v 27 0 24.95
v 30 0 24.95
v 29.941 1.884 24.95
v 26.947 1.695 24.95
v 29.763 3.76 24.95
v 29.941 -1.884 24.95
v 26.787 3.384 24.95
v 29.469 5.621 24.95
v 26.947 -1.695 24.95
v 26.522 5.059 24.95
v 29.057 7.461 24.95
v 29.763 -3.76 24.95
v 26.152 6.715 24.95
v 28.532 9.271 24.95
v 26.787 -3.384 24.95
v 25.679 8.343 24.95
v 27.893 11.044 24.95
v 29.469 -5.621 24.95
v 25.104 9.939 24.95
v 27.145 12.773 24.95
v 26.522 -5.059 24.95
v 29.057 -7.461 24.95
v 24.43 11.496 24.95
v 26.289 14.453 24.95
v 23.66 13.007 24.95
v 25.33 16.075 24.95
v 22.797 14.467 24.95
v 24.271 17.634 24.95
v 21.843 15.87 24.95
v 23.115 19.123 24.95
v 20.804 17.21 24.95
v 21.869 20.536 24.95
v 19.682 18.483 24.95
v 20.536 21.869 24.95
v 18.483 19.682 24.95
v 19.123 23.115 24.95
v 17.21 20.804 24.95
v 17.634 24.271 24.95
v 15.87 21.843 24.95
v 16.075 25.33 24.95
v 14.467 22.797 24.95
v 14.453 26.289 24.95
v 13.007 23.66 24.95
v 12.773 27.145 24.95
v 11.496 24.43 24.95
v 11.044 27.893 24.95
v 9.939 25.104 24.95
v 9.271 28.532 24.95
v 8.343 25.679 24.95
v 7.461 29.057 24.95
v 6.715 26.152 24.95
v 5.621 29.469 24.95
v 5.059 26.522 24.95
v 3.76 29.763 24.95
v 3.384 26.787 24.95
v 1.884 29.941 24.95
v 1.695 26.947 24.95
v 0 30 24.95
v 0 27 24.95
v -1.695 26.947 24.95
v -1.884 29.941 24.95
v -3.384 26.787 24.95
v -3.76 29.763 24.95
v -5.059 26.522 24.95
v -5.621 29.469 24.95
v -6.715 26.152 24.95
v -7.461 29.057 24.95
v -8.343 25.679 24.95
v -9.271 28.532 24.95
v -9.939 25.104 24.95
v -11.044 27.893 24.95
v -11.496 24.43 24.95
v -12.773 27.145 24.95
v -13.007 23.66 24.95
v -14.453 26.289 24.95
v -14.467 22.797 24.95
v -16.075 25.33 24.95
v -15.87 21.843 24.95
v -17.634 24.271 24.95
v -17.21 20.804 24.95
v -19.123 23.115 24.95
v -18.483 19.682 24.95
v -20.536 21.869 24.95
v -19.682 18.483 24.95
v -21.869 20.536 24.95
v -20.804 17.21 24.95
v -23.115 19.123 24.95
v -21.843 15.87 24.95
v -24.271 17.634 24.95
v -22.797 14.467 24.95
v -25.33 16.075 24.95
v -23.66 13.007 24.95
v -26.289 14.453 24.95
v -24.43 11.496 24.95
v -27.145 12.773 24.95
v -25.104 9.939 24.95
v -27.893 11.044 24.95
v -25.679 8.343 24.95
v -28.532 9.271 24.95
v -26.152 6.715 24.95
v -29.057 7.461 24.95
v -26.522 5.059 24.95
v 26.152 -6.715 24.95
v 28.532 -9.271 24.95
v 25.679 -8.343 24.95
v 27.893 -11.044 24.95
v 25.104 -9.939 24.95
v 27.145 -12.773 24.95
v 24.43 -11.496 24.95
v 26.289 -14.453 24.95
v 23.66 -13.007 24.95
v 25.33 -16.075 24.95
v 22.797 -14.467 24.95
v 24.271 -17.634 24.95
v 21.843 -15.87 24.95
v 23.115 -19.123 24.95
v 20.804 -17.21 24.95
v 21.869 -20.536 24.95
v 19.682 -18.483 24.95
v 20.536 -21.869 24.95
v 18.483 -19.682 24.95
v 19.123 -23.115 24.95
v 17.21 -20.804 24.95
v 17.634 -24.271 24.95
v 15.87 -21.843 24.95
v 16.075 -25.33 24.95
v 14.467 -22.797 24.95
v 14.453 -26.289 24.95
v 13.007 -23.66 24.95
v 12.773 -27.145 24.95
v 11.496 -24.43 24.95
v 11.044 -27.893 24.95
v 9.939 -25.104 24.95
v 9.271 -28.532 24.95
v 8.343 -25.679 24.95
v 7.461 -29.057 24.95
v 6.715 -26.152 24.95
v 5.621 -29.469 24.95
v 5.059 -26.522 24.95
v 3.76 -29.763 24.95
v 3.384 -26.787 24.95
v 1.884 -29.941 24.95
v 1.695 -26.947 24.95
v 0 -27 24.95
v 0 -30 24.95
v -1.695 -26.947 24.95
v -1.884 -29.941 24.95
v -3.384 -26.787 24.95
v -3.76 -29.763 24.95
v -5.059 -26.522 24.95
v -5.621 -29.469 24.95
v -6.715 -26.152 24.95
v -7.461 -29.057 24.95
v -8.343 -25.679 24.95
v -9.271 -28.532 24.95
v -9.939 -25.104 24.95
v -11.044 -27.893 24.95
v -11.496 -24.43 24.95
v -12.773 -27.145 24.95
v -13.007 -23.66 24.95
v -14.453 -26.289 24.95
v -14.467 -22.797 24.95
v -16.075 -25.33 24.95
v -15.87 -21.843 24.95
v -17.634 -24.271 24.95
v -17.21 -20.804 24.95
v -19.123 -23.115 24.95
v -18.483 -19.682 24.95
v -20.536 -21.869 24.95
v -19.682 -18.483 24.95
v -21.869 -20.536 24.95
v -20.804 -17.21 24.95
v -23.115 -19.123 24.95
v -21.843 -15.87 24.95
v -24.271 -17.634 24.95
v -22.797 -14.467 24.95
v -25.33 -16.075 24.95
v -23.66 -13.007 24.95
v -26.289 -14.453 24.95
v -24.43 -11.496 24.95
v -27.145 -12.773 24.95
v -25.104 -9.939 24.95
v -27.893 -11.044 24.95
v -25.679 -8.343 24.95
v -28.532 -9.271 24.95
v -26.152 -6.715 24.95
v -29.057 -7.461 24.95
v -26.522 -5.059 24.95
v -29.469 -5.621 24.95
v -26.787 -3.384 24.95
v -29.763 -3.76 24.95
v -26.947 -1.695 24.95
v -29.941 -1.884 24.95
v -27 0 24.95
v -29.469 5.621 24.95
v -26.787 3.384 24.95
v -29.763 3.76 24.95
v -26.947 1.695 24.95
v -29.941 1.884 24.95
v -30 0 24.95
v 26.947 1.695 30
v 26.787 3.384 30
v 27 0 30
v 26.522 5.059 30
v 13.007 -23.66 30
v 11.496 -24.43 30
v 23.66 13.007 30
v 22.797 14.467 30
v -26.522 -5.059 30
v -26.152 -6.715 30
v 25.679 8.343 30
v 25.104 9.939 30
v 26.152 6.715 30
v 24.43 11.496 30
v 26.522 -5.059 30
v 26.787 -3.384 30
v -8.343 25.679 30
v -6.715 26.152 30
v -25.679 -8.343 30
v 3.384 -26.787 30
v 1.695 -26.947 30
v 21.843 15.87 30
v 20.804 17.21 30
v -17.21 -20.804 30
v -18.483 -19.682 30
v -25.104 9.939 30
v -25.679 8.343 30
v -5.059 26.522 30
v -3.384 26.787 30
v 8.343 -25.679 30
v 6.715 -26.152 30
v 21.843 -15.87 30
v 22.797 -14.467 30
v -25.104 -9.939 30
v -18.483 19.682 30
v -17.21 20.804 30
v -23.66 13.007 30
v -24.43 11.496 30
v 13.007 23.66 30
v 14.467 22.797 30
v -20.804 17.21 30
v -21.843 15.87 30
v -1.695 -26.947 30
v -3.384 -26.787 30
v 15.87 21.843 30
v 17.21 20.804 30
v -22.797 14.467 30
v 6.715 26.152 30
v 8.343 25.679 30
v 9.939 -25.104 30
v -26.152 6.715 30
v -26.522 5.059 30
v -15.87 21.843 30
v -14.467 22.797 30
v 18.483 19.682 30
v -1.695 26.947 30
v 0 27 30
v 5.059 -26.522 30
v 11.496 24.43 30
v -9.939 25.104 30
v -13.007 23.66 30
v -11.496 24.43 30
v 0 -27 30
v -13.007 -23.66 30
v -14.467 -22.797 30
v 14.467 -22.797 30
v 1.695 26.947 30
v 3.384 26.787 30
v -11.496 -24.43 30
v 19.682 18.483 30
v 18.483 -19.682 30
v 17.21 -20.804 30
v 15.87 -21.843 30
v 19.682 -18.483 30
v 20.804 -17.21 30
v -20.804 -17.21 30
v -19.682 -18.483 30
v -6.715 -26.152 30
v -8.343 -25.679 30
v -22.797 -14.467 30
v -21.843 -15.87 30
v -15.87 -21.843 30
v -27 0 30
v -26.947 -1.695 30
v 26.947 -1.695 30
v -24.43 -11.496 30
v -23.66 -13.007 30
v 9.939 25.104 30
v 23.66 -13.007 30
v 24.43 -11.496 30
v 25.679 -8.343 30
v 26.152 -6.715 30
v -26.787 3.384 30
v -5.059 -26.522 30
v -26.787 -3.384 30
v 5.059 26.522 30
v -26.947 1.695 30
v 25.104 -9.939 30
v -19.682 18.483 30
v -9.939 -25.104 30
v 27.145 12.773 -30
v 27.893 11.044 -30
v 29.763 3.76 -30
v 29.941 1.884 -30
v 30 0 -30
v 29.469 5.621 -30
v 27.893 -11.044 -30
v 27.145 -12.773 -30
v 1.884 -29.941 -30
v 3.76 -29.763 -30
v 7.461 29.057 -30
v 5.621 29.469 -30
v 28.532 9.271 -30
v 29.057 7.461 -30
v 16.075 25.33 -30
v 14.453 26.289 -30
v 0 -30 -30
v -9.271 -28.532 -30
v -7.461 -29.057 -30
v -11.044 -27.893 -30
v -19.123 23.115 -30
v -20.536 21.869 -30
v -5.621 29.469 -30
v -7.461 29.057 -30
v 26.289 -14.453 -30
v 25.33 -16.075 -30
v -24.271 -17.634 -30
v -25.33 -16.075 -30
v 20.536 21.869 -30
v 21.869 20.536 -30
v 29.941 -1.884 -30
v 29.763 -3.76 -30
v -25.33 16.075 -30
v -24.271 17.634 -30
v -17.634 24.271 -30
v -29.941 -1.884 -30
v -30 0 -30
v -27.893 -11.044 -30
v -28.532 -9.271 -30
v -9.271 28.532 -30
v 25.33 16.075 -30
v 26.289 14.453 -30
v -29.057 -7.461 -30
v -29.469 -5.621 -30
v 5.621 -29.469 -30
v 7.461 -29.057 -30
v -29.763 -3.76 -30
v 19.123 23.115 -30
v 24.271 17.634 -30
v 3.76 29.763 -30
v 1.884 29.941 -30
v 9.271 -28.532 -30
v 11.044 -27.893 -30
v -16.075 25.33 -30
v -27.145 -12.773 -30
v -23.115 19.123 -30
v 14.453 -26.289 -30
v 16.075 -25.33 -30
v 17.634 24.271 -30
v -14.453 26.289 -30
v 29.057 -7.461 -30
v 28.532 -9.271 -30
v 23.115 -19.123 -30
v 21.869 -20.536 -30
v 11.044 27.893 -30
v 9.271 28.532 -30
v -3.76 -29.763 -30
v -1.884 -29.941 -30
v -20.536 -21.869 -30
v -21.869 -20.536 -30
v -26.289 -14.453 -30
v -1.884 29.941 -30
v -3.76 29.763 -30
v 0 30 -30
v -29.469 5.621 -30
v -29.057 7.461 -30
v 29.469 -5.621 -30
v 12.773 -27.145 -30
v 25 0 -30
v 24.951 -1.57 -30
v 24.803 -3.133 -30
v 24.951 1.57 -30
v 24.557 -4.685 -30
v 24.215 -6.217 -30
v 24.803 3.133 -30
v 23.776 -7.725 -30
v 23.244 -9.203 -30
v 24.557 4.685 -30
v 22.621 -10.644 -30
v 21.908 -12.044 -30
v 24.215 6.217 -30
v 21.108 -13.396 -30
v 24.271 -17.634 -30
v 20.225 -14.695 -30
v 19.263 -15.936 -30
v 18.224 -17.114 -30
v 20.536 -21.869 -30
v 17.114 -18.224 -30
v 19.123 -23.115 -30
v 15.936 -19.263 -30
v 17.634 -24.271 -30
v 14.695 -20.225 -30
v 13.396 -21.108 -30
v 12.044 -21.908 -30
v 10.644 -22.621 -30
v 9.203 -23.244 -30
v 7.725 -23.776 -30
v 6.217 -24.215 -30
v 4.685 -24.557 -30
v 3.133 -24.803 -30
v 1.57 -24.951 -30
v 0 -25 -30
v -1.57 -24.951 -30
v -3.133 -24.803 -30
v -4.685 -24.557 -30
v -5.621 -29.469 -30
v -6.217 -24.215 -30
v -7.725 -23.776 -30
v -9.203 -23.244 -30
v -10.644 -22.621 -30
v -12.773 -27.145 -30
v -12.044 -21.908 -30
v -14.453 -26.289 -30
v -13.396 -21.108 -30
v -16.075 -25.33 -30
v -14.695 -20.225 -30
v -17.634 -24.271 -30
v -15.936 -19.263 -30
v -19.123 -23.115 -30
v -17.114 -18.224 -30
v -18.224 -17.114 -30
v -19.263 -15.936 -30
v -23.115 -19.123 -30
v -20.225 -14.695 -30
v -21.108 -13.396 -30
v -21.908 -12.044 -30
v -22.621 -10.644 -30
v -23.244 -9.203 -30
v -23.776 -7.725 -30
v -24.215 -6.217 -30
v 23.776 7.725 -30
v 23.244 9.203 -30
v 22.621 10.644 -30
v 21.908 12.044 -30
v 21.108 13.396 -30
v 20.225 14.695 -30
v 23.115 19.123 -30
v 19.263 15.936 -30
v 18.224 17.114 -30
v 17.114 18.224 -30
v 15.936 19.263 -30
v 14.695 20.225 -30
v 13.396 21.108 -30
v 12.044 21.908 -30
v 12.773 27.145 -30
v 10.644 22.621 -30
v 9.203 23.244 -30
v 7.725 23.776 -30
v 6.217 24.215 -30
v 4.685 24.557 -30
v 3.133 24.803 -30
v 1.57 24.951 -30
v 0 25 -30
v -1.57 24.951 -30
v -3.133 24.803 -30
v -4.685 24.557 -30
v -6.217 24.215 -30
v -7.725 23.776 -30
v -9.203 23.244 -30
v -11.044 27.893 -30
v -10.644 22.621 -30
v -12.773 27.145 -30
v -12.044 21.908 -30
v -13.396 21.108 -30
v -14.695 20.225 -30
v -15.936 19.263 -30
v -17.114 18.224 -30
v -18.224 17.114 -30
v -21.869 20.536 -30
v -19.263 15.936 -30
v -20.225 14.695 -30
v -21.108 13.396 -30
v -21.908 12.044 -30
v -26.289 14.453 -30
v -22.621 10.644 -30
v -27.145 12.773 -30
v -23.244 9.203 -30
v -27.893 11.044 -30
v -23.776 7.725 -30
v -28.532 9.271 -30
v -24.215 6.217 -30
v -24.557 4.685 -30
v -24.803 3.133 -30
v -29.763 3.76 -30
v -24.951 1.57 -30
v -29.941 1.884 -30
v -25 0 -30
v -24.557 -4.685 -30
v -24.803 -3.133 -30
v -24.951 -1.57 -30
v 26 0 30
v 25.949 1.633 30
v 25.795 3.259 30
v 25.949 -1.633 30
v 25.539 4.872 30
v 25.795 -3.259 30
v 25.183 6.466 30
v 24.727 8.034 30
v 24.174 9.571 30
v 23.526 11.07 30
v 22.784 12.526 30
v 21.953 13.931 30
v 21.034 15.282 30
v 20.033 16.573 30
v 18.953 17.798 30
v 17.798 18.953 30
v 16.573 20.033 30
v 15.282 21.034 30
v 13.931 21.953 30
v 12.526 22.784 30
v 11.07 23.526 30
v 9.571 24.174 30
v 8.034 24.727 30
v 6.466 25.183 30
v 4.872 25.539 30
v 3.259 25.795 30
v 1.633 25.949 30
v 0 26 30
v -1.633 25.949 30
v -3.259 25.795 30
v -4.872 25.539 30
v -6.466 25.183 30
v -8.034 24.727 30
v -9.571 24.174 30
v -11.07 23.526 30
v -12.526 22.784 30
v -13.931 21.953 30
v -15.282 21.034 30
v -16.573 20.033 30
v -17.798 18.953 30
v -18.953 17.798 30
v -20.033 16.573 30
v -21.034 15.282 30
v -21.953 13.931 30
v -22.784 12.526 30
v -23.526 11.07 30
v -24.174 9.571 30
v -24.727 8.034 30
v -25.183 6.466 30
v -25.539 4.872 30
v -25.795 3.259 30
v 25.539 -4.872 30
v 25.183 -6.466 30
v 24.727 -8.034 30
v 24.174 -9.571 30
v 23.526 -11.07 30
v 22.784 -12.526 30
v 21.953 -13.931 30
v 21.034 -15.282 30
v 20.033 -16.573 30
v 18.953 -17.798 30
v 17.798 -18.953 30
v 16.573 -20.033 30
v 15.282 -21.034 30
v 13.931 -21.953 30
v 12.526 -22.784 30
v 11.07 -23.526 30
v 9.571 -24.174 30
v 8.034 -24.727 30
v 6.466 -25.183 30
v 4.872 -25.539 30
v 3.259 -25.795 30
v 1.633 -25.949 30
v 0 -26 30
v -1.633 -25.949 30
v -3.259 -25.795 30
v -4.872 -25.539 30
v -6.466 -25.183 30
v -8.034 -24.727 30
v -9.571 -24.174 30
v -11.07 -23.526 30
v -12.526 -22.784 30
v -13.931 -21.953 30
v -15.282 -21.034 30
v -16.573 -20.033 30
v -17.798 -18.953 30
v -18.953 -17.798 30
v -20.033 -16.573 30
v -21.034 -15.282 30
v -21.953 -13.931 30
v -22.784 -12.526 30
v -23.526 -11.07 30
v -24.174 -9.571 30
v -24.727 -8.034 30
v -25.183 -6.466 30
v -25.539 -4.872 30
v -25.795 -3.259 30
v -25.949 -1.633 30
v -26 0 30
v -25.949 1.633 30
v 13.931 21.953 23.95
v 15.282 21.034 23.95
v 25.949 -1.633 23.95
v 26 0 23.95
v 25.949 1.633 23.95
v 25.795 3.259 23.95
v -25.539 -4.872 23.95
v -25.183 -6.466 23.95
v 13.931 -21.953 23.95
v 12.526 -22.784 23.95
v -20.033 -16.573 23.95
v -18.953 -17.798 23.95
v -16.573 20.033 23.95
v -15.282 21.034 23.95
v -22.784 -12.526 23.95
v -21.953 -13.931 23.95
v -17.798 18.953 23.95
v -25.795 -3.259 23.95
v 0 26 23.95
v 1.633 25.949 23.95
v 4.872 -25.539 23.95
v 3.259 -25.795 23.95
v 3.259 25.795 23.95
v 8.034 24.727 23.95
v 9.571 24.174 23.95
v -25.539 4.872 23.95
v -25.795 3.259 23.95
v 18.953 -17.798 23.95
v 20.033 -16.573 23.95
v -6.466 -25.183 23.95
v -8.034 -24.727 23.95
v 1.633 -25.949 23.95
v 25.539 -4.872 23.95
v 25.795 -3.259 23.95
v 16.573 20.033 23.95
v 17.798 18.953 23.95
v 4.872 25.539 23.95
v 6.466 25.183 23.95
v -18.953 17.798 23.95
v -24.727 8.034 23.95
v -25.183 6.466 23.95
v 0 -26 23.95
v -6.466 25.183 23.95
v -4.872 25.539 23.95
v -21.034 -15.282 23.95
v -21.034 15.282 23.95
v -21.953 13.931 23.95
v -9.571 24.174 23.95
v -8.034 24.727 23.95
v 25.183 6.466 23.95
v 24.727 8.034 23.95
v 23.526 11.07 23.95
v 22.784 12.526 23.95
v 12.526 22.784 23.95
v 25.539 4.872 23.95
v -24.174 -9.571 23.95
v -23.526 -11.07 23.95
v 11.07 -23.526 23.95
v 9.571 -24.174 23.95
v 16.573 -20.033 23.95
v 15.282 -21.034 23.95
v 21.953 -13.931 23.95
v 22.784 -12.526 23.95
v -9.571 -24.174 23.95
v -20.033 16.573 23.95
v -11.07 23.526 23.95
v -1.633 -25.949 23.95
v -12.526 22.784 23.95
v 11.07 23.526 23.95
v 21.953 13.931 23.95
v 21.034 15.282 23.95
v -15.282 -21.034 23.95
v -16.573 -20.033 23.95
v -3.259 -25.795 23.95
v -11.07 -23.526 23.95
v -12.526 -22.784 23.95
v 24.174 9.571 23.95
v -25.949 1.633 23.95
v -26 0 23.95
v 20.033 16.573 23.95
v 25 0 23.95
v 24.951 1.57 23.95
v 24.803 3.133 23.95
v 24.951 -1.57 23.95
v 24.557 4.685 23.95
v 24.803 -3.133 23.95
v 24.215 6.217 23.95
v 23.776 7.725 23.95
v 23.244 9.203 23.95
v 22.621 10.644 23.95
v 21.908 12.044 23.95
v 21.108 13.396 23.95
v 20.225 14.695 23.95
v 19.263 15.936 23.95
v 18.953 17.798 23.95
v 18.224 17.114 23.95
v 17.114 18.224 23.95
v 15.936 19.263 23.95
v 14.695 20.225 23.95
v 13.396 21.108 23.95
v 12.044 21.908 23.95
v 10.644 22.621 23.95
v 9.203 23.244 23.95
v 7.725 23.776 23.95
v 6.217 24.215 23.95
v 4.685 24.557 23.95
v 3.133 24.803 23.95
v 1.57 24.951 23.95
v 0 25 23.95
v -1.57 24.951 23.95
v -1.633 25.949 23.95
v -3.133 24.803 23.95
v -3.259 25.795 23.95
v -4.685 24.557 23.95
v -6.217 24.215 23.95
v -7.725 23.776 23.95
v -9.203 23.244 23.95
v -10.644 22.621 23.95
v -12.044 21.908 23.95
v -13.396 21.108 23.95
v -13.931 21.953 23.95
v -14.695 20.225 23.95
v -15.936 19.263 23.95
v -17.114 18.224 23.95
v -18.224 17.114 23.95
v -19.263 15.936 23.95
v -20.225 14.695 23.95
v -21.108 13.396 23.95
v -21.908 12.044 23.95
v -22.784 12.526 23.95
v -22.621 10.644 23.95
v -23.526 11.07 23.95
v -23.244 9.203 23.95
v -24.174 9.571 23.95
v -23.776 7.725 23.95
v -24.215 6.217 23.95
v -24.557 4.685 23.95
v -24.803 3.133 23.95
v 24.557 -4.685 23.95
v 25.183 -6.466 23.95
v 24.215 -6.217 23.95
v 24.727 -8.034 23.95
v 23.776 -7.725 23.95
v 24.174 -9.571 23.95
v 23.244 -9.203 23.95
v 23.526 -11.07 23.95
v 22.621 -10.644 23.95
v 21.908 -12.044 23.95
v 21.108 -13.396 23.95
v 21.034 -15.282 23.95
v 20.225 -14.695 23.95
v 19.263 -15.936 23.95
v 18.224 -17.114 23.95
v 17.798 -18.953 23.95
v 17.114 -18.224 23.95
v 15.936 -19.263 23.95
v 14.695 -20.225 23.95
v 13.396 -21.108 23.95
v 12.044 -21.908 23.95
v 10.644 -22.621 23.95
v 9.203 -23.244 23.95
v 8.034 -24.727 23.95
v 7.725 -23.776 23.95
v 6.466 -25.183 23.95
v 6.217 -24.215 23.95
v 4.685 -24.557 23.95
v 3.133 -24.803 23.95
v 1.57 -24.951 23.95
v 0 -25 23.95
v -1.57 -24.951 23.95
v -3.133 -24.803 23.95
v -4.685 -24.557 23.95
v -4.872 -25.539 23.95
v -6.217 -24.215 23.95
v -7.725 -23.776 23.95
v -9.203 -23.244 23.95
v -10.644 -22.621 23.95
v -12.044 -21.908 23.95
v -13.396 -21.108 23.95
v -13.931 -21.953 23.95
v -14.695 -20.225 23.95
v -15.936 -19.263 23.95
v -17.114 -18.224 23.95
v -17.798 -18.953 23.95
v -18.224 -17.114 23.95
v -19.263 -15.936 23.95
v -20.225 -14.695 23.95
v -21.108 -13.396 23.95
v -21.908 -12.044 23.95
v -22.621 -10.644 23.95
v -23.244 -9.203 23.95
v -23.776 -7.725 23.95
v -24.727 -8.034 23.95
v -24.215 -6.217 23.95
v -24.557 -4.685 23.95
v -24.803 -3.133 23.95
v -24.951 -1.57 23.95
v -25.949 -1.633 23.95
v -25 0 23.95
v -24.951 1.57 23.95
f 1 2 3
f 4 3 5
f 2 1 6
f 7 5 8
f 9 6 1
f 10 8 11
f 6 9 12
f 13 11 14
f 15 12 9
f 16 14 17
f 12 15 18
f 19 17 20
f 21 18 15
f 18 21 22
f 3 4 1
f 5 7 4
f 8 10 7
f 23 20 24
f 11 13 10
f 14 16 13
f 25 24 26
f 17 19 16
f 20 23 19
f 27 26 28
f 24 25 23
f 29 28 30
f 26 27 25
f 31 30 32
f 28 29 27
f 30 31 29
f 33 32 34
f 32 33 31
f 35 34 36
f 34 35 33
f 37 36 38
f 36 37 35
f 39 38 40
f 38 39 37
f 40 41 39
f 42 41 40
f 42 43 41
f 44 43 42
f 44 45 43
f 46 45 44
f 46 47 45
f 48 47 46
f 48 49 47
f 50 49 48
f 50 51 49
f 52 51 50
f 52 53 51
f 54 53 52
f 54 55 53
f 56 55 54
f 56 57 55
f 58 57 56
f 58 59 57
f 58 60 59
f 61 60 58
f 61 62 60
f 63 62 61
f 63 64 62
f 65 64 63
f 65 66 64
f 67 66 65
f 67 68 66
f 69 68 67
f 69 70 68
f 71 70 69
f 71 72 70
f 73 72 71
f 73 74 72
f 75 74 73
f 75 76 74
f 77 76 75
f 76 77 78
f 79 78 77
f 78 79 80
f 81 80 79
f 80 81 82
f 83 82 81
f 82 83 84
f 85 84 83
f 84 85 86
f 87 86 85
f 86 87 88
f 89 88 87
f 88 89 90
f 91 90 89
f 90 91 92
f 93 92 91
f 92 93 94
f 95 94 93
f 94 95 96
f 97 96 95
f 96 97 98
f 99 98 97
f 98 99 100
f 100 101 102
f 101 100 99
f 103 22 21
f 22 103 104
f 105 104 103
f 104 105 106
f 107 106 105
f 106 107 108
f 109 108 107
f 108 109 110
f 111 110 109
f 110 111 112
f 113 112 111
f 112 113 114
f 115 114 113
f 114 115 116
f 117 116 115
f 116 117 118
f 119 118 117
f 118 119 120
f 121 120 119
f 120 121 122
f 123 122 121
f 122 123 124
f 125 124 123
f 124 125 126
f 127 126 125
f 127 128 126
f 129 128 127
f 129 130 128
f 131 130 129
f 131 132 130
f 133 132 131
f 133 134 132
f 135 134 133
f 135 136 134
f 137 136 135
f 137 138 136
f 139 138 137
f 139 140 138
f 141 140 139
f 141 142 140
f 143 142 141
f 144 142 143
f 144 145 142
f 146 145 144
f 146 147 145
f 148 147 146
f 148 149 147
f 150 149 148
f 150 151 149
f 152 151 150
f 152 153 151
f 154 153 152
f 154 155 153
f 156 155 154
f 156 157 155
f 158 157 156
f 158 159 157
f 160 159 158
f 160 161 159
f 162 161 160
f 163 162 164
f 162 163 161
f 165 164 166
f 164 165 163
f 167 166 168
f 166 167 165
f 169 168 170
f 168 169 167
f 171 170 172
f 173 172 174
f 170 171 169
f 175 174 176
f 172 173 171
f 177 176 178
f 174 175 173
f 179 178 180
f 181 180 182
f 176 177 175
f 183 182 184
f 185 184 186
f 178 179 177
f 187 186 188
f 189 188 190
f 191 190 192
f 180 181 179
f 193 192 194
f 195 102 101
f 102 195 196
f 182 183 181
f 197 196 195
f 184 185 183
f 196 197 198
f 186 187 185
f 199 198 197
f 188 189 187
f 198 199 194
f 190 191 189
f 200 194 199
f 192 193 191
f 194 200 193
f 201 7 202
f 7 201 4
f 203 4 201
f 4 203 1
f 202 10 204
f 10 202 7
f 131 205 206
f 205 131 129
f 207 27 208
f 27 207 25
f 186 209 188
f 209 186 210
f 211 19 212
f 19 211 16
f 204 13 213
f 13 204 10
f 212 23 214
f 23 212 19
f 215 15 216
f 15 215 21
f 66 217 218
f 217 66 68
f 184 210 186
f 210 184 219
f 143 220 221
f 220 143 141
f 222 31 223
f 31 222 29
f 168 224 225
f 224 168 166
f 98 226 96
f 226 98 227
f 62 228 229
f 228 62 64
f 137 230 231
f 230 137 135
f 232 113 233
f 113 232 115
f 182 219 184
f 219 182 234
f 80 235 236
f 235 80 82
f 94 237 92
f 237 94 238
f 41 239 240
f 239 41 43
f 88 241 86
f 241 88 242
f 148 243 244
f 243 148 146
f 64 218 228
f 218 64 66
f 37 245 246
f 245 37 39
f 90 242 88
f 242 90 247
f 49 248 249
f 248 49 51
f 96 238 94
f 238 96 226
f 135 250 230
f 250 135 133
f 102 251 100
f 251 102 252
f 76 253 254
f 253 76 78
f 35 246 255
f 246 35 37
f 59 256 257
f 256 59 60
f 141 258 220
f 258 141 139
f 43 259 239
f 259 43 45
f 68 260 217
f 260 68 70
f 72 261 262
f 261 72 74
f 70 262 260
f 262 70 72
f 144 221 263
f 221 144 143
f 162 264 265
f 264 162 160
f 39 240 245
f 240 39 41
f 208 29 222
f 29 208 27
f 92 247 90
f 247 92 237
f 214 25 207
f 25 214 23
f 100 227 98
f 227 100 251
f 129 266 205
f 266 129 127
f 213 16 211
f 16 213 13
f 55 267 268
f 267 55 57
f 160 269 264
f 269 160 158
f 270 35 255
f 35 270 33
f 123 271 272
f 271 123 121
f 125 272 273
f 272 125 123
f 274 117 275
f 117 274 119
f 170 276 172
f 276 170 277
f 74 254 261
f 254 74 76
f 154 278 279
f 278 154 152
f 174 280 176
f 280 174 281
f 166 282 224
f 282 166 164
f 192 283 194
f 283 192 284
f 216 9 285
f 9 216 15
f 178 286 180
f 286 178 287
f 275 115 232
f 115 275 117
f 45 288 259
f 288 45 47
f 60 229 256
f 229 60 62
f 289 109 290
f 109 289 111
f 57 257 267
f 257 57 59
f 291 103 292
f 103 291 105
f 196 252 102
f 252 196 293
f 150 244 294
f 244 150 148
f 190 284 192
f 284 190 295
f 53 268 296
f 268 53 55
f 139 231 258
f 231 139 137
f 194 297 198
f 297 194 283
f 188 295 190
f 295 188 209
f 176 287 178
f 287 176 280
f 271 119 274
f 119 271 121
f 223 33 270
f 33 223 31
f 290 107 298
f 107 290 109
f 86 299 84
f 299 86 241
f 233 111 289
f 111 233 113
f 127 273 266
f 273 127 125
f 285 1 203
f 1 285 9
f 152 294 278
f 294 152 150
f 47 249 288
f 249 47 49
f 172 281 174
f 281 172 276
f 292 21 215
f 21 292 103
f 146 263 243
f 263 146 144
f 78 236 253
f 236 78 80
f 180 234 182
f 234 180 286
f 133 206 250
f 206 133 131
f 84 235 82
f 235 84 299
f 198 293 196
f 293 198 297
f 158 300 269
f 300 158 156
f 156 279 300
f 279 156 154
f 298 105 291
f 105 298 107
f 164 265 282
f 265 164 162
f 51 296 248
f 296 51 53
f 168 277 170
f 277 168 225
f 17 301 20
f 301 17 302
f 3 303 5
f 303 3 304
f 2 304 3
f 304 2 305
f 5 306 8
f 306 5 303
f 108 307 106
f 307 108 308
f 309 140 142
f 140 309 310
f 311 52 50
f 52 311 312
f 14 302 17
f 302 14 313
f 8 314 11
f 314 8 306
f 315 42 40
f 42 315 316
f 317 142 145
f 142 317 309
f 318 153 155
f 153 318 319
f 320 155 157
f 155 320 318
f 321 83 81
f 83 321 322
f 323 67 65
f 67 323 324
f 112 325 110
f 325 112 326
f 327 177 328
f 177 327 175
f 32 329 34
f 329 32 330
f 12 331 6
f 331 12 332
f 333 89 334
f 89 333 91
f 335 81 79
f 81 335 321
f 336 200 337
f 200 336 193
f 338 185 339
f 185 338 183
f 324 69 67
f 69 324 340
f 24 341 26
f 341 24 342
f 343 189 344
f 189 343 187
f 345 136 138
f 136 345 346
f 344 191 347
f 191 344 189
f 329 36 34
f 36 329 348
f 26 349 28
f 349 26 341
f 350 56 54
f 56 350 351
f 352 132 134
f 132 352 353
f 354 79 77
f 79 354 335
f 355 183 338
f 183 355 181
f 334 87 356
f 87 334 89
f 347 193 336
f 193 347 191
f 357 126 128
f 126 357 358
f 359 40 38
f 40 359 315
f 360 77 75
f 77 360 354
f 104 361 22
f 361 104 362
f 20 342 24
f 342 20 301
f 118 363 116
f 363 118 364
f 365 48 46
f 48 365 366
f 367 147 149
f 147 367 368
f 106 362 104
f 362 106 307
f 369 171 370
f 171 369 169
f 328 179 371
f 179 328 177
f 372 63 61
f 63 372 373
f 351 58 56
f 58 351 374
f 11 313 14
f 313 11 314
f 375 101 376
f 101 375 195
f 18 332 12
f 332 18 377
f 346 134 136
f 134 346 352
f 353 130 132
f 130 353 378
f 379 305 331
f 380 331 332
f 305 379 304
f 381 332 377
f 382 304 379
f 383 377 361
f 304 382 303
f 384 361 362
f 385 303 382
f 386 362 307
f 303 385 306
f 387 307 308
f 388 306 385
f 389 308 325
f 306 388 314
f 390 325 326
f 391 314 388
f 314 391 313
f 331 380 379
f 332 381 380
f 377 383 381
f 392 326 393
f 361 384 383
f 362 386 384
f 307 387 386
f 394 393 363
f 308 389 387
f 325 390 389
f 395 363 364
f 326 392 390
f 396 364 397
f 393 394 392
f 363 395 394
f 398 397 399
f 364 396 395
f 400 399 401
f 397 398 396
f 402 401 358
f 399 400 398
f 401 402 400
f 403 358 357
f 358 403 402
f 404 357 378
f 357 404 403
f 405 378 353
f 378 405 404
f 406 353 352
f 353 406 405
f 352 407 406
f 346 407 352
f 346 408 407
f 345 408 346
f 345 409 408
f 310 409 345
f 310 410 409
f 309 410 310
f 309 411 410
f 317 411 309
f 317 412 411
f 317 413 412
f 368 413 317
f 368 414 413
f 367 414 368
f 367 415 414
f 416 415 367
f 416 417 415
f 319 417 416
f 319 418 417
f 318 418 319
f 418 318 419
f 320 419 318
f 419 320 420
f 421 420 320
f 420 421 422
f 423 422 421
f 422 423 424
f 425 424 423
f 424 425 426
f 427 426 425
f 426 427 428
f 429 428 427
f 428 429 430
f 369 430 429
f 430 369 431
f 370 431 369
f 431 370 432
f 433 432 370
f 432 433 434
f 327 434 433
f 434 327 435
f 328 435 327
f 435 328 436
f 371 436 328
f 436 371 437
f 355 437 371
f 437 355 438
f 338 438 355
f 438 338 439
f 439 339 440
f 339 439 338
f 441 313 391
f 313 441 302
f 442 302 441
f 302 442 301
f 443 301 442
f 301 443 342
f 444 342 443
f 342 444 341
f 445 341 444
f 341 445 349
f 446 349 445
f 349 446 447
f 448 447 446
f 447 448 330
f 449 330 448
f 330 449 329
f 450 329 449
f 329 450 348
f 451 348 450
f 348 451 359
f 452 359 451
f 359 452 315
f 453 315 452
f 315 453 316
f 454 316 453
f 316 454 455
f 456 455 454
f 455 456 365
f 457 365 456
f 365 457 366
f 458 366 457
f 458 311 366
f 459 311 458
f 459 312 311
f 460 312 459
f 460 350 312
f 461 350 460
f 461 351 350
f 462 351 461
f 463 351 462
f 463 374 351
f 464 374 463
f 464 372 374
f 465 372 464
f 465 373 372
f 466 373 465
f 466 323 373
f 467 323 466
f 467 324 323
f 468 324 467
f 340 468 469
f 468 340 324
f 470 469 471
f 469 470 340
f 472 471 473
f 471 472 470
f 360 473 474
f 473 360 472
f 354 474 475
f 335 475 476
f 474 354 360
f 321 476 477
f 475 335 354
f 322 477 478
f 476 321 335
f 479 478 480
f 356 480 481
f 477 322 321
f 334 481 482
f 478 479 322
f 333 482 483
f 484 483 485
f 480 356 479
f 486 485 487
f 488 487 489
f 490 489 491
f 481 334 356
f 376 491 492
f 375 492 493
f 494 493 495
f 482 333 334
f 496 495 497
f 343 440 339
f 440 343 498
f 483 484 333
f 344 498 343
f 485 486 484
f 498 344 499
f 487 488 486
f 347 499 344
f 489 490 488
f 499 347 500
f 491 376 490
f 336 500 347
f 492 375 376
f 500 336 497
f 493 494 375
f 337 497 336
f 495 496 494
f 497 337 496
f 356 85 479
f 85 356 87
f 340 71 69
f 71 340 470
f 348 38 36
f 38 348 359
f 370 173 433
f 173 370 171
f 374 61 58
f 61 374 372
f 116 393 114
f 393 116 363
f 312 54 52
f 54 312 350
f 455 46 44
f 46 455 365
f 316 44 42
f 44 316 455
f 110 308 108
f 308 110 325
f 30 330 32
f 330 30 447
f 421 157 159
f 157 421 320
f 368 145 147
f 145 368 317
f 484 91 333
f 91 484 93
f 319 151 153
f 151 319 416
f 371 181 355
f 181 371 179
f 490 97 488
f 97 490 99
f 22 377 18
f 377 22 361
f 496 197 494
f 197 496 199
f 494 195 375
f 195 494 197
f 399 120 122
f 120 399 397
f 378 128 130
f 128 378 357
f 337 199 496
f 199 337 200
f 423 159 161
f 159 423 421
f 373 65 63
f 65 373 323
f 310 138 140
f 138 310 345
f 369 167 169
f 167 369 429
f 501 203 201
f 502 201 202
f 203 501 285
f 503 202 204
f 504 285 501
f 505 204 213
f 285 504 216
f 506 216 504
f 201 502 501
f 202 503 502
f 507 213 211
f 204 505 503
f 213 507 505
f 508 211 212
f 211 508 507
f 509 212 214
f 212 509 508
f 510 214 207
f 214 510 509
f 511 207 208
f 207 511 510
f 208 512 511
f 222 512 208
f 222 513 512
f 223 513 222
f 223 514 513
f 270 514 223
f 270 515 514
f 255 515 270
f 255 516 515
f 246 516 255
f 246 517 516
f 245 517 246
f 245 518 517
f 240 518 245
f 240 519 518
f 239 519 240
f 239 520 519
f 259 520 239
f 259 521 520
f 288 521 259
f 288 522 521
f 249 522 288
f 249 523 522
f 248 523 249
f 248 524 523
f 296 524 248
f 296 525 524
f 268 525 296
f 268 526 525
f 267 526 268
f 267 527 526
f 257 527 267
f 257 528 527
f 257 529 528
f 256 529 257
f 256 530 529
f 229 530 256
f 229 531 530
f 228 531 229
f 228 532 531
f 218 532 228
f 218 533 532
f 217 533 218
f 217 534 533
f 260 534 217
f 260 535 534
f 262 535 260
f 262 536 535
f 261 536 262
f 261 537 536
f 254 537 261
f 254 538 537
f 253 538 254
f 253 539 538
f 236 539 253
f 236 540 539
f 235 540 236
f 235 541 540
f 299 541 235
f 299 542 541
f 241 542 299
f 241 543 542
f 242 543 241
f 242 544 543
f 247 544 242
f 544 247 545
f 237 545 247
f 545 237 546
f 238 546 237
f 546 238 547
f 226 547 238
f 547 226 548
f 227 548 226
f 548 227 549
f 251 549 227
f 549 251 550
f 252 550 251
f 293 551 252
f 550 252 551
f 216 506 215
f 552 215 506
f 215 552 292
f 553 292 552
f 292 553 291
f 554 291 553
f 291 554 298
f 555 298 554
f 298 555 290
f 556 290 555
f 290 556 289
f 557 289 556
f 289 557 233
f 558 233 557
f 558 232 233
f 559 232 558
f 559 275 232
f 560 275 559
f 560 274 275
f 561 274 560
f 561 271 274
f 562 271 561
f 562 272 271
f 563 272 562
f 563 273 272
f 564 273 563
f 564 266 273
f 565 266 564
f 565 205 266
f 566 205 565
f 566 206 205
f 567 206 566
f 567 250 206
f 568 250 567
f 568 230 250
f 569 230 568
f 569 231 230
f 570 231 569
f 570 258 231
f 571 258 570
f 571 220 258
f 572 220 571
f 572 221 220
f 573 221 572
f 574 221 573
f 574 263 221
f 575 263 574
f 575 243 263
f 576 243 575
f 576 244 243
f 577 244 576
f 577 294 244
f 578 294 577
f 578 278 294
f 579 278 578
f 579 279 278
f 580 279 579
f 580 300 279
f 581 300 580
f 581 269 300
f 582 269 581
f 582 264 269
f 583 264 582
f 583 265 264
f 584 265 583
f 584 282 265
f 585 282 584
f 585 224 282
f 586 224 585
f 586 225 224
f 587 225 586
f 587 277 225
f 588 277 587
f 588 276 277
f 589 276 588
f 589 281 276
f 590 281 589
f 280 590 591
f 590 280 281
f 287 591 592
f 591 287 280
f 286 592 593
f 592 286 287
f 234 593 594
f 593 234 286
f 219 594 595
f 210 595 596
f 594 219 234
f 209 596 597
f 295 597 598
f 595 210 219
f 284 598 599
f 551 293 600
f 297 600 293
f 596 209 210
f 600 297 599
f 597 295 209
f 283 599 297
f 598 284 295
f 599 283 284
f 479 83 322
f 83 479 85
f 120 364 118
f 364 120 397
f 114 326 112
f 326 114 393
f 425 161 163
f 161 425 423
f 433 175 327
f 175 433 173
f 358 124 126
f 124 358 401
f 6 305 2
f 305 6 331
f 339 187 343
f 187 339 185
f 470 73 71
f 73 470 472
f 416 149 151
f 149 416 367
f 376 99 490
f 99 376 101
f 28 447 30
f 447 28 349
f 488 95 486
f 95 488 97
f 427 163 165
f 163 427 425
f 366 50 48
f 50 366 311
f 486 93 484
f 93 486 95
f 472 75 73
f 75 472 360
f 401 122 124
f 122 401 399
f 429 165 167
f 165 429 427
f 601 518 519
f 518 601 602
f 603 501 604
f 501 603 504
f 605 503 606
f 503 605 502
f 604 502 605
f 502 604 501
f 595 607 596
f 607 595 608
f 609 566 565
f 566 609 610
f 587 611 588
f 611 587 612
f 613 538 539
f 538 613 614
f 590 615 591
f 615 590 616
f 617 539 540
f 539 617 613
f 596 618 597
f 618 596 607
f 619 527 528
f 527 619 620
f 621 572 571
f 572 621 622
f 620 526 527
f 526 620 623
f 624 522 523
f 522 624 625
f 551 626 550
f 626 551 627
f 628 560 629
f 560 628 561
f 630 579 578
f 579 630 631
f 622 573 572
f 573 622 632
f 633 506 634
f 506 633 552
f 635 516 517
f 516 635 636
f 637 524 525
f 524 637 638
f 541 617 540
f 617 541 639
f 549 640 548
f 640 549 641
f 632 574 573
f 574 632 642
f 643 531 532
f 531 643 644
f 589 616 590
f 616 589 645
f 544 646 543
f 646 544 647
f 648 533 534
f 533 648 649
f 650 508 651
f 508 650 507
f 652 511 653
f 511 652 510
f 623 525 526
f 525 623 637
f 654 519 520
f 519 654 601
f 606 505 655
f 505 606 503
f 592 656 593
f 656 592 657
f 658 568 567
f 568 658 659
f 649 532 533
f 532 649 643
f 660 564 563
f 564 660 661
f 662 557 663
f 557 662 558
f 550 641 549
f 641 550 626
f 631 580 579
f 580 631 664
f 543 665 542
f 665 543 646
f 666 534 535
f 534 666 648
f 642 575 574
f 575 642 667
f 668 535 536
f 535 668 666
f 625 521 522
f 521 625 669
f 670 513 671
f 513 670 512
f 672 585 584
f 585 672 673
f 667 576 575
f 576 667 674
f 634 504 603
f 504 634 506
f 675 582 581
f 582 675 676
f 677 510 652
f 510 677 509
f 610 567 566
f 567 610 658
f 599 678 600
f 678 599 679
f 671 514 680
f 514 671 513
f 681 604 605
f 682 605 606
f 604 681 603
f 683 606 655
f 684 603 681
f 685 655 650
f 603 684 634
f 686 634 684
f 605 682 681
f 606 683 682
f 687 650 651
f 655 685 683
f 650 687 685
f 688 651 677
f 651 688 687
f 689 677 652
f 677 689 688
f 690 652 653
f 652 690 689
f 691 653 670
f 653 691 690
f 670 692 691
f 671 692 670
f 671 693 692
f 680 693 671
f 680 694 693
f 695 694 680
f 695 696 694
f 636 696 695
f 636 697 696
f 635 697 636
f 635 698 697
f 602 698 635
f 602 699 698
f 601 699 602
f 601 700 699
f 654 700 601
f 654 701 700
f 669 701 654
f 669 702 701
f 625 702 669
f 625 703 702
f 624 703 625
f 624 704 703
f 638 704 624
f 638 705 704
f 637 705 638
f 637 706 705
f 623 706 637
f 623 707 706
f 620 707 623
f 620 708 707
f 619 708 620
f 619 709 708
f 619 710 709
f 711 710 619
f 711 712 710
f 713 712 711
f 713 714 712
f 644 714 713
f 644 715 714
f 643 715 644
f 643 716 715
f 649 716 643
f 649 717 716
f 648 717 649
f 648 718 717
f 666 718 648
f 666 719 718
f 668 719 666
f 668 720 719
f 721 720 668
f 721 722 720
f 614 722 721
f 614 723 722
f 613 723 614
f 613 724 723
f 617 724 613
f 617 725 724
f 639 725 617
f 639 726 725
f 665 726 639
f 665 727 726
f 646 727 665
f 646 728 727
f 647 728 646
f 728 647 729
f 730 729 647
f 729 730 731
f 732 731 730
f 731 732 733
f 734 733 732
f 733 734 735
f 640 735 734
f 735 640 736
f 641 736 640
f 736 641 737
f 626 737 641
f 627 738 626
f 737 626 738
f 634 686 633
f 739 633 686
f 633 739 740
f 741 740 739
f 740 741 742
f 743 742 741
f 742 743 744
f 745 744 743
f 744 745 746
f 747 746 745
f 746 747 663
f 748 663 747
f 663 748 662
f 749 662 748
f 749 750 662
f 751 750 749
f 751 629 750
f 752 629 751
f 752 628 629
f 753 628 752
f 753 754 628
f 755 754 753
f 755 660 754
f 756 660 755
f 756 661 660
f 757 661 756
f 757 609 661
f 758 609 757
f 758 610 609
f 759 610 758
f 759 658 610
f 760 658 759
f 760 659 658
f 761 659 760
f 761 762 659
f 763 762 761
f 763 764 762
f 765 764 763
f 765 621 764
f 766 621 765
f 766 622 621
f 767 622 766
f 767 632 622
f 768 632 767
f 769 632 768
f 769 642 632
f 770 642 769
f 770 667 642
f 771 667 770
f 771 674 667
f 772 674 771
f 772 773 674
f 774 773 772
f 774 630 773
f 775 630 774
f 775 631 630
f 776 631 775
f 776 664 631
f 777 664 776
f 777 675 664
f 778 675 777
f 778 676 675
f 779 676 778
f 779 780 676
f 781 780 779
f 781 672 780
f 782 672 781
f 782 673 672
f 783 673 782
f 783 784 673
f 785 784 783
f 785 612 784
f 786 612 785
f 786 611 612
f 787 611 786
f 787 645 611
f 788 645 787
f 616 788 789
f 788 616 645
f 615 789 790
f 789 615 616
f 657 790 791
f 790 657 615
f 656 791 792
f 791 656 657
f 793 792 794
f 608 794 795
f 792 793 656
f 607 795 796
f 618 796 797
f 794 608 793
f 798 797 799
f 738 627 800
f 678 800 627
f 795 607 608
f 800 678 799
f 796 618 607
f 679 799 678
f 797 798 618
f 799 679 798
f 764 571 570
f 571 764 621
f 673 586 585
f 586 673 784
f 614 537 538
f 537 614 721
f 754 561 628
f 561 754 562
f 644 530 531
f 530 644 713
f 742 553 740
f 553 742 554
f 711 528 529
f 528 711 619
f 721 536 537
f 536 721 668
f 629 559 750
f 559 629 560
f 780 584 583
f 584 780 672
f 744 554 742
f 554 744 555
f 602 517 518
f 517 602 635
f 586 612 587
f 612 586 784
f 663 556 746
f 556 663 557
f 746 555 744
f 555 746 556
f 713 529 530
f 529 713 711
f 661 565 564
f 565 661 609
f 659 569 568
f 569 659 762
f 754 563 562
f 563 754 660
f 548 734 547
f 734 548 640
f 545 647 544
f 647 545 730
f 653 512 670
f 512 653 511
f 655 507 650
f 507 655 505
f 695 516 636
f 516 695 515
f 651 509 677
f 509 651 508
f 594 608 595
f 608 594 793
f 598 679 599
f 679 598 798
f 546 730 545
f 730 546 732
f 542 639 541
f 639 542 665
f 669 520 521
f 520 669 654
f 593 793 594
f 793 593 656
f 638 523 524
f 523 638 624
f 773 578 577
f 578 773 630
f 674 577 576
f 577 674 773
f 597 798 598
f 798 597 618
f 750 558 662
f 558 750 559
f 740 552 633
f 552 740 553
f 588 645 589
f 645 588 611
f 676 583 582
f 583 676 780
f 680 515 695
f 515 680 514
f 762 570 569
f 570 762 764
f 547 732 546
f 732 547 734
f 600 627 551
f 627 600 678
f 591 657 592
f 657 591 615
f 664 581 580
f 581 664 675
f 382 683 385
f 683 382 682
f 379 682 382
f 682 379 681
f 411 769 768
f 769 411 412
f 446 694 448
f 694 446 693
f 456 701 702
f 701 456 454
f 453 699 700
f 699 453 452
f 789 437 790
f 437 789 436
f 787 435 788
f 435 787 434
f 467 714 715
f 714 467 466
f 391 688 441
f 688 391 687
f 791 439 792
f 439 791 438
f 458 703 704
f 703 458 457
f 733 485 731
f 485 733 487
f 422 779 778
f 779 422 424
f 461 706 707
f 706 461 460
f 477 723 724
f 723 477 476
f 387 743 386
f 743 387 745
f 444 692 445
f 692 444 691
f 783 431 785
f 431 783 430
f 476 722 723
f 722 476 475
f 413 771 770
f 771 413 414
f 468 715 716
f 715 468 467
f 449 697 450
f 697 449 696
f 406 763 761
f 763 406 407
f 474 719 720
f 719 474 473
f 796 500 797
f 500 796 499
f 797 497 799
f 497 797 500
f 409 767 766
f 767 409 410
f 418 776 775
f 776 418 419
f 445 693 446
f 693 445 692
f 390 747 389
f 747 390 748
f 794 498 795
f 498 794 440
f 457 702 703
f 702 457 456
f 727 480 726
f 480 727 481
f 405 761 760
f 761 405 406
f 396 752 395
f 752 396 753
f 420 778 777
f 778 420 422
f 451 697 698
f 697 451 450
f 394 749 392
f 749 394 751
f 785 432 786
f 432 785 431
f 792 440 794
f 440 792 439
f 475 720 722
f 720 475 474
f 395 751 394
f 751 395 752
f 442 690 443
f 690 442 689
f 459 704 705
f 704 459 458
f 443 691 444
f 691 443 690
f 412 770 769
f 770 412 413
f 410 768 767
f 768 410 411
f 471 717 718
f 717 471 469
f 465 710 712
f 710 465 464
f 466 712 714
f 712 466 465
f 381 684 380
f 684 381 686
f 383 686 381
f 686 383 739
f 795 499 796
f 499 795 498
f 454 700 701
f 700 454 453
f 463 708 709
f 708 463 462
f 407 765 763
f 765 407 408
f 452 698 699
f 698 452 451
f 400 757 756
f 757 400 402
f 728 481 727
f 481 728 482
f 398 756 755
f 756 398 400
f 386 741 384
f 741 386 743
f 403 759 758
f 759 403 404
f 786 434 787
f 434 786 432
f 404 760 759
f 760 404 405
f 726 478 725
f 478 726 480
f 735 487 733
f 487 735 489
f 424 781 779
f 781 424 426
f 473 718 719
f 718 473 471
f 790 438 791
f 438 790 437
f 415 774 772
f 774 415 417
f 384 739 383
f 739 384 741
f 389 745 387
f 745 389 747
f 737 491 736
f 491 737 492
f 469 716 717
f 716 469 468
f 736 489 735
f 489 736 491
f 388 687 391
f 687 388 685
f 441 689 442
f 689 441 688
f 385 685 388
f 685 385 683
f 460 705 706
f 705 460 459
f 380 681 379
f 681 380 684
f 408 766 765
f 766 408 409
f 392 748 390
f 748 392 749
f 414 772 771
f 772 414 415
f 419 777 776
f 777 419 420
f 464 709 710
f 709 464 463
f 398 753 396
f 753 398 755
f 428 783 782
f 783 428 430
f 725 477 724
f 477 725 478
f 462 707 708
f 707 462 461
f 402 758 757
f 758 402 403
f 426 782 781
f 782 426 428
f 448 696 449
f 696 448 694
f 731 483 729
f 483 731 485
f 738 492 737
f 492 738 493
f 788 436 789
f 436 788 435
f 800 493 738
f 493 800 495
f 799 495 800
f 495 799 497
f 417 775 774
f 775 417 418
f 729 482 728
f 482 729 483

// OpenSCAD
$fn=40; // model faces resolution.

prumer_rotoru1=60;
vyska_rotoru1=5;
vyska_rotoru2=5;
prumer_sroubu=3.2;
prumer_hlavy_sroubu=6;
vyska_hlavy_sroubu=4;
vyska_matky=3;
sirka_matky=6;
prumer_orechu=10;
sila_materialu=2;
sila_materialu_vule=0.2;
hloubka_prekryti=2;

//lozisko
lozisko_prumer_vnitrni=5;
lozisko_prumer_vnejsi=16;
lozisko_vyska=5;
lozisko_prekryv=1.5;

//stator1
stator1_sila=2;

//stator2
sila_pod_loziskem=1;

//stator3
stator3_sila_steny=2;
stator3_vzdalenost_od_steny=1; //definuje vzdalenost hlavy sroubu od steny statrou 4
stator3_vyska=60;
stator3_vyska_prekryti=5;

vule1=1; //vůle mezi statorem a rotorem ze strany

//nastevní rotoru2
vyska_kryti=5;

//lopatka
hloubka_uchytu=20;
sila_uchytu=12;
vyska_uchytu=10;
tolerance_uchytu=0.1;

//parametry uchytu senzoru
roztec_der=10.16;
vzdalenost_der_x=2*roztec_der;
vzdalenost_der_y=1*roztec_der;







difference()
{
  
cylinder (h = stator3_vyska, r=(prumer_rotoru1)/2, center = true, $fn=100); 
 
    translate([0,0,(stator3_vyska-lozisko_vyska-sila_pod_loziskem)/2])
    
cylinder (h = lozisko_vyska+sila_pod_loziskem+0.1, r=(prumer_rotoru1-2*sila_materialu-2*vule1-stator3_sila_steny)/2, center = true, $fn=100);

cylinder (h = stator3_vyska+0.1, r=(prumer_rotoru1-2*sila_materialu-2*vule1-2*stator3_sila_steny)/2, center = true, $fn=100);
    
   
    
    
 translate([0,0,(stator3_vyska-stator3_vyska_prekryti)/2])    
difference()  
 {   
     
cylinder (h = stator3_vyska_prekryti+0.1, r=(prumer_rotoru1+0.1)/2, center = true, $fn=100); 
 
     
 cylinder (h = stator3_vyska_prekryti+0.1, r=(prumer_rotoru1-2*sila_materialu-2*vule1)/2, center = true, $fn=100);   
    
 }   
    
    
    
    
    
    






//otvory pro uchyceni stator 3
//otvor pro sroub 1
      translate([0,(prumer_rotoru1-2*sila_materialu-2*vule1-2*stator3_sila_steny-prumer_hlavy_sroubu-2*stator3_vzdalenost_od_steny)/2,0])
cylinder (h = lozisko_vyska+sila_pod_loziskem+0.1, r=prumer_sroubu/2, center = true, $fn=100);

      translate([0,(prumer_rotoru1-2*sila_materialu-2*vule1-2*stator3_sila_steny-prumer_hlavy_sroubu-2*stator3_vzdalenost_od_steny)/2,2])
cylinder (h = lozisko_vyska+sila_pod_loziskem+0.1, r=prumer_hlavy_sroubu/2, center = true, $fn=100);

//otvor pro sroub 2
      translate([0,-(prumer_rotoru1-2*sila_materialu-2*vule1-2*stator3_sila_steny-prumer_hlavy_sroubu-2*stator3_vzdalenost_od_steny)/2,0])
cylinder (h = lozisko_vyska+sila_pod_loziskem+0.1, r=prumer_sroubu/2, center = true, $fn=100);

      translate([0,-(prumer_rotoru1-2*sila_materialu-2*vule1-2*stator3_sila_steny-prumer_hlavy_sroubu-2*stator3_vzdalenost_od_steny)/2,2])
cylinder (h = lozisko_vyska+sila_pod_loziskem+0.1, r=prumer_hlavy_sroubu/2, center = true, $fn=100);


}
